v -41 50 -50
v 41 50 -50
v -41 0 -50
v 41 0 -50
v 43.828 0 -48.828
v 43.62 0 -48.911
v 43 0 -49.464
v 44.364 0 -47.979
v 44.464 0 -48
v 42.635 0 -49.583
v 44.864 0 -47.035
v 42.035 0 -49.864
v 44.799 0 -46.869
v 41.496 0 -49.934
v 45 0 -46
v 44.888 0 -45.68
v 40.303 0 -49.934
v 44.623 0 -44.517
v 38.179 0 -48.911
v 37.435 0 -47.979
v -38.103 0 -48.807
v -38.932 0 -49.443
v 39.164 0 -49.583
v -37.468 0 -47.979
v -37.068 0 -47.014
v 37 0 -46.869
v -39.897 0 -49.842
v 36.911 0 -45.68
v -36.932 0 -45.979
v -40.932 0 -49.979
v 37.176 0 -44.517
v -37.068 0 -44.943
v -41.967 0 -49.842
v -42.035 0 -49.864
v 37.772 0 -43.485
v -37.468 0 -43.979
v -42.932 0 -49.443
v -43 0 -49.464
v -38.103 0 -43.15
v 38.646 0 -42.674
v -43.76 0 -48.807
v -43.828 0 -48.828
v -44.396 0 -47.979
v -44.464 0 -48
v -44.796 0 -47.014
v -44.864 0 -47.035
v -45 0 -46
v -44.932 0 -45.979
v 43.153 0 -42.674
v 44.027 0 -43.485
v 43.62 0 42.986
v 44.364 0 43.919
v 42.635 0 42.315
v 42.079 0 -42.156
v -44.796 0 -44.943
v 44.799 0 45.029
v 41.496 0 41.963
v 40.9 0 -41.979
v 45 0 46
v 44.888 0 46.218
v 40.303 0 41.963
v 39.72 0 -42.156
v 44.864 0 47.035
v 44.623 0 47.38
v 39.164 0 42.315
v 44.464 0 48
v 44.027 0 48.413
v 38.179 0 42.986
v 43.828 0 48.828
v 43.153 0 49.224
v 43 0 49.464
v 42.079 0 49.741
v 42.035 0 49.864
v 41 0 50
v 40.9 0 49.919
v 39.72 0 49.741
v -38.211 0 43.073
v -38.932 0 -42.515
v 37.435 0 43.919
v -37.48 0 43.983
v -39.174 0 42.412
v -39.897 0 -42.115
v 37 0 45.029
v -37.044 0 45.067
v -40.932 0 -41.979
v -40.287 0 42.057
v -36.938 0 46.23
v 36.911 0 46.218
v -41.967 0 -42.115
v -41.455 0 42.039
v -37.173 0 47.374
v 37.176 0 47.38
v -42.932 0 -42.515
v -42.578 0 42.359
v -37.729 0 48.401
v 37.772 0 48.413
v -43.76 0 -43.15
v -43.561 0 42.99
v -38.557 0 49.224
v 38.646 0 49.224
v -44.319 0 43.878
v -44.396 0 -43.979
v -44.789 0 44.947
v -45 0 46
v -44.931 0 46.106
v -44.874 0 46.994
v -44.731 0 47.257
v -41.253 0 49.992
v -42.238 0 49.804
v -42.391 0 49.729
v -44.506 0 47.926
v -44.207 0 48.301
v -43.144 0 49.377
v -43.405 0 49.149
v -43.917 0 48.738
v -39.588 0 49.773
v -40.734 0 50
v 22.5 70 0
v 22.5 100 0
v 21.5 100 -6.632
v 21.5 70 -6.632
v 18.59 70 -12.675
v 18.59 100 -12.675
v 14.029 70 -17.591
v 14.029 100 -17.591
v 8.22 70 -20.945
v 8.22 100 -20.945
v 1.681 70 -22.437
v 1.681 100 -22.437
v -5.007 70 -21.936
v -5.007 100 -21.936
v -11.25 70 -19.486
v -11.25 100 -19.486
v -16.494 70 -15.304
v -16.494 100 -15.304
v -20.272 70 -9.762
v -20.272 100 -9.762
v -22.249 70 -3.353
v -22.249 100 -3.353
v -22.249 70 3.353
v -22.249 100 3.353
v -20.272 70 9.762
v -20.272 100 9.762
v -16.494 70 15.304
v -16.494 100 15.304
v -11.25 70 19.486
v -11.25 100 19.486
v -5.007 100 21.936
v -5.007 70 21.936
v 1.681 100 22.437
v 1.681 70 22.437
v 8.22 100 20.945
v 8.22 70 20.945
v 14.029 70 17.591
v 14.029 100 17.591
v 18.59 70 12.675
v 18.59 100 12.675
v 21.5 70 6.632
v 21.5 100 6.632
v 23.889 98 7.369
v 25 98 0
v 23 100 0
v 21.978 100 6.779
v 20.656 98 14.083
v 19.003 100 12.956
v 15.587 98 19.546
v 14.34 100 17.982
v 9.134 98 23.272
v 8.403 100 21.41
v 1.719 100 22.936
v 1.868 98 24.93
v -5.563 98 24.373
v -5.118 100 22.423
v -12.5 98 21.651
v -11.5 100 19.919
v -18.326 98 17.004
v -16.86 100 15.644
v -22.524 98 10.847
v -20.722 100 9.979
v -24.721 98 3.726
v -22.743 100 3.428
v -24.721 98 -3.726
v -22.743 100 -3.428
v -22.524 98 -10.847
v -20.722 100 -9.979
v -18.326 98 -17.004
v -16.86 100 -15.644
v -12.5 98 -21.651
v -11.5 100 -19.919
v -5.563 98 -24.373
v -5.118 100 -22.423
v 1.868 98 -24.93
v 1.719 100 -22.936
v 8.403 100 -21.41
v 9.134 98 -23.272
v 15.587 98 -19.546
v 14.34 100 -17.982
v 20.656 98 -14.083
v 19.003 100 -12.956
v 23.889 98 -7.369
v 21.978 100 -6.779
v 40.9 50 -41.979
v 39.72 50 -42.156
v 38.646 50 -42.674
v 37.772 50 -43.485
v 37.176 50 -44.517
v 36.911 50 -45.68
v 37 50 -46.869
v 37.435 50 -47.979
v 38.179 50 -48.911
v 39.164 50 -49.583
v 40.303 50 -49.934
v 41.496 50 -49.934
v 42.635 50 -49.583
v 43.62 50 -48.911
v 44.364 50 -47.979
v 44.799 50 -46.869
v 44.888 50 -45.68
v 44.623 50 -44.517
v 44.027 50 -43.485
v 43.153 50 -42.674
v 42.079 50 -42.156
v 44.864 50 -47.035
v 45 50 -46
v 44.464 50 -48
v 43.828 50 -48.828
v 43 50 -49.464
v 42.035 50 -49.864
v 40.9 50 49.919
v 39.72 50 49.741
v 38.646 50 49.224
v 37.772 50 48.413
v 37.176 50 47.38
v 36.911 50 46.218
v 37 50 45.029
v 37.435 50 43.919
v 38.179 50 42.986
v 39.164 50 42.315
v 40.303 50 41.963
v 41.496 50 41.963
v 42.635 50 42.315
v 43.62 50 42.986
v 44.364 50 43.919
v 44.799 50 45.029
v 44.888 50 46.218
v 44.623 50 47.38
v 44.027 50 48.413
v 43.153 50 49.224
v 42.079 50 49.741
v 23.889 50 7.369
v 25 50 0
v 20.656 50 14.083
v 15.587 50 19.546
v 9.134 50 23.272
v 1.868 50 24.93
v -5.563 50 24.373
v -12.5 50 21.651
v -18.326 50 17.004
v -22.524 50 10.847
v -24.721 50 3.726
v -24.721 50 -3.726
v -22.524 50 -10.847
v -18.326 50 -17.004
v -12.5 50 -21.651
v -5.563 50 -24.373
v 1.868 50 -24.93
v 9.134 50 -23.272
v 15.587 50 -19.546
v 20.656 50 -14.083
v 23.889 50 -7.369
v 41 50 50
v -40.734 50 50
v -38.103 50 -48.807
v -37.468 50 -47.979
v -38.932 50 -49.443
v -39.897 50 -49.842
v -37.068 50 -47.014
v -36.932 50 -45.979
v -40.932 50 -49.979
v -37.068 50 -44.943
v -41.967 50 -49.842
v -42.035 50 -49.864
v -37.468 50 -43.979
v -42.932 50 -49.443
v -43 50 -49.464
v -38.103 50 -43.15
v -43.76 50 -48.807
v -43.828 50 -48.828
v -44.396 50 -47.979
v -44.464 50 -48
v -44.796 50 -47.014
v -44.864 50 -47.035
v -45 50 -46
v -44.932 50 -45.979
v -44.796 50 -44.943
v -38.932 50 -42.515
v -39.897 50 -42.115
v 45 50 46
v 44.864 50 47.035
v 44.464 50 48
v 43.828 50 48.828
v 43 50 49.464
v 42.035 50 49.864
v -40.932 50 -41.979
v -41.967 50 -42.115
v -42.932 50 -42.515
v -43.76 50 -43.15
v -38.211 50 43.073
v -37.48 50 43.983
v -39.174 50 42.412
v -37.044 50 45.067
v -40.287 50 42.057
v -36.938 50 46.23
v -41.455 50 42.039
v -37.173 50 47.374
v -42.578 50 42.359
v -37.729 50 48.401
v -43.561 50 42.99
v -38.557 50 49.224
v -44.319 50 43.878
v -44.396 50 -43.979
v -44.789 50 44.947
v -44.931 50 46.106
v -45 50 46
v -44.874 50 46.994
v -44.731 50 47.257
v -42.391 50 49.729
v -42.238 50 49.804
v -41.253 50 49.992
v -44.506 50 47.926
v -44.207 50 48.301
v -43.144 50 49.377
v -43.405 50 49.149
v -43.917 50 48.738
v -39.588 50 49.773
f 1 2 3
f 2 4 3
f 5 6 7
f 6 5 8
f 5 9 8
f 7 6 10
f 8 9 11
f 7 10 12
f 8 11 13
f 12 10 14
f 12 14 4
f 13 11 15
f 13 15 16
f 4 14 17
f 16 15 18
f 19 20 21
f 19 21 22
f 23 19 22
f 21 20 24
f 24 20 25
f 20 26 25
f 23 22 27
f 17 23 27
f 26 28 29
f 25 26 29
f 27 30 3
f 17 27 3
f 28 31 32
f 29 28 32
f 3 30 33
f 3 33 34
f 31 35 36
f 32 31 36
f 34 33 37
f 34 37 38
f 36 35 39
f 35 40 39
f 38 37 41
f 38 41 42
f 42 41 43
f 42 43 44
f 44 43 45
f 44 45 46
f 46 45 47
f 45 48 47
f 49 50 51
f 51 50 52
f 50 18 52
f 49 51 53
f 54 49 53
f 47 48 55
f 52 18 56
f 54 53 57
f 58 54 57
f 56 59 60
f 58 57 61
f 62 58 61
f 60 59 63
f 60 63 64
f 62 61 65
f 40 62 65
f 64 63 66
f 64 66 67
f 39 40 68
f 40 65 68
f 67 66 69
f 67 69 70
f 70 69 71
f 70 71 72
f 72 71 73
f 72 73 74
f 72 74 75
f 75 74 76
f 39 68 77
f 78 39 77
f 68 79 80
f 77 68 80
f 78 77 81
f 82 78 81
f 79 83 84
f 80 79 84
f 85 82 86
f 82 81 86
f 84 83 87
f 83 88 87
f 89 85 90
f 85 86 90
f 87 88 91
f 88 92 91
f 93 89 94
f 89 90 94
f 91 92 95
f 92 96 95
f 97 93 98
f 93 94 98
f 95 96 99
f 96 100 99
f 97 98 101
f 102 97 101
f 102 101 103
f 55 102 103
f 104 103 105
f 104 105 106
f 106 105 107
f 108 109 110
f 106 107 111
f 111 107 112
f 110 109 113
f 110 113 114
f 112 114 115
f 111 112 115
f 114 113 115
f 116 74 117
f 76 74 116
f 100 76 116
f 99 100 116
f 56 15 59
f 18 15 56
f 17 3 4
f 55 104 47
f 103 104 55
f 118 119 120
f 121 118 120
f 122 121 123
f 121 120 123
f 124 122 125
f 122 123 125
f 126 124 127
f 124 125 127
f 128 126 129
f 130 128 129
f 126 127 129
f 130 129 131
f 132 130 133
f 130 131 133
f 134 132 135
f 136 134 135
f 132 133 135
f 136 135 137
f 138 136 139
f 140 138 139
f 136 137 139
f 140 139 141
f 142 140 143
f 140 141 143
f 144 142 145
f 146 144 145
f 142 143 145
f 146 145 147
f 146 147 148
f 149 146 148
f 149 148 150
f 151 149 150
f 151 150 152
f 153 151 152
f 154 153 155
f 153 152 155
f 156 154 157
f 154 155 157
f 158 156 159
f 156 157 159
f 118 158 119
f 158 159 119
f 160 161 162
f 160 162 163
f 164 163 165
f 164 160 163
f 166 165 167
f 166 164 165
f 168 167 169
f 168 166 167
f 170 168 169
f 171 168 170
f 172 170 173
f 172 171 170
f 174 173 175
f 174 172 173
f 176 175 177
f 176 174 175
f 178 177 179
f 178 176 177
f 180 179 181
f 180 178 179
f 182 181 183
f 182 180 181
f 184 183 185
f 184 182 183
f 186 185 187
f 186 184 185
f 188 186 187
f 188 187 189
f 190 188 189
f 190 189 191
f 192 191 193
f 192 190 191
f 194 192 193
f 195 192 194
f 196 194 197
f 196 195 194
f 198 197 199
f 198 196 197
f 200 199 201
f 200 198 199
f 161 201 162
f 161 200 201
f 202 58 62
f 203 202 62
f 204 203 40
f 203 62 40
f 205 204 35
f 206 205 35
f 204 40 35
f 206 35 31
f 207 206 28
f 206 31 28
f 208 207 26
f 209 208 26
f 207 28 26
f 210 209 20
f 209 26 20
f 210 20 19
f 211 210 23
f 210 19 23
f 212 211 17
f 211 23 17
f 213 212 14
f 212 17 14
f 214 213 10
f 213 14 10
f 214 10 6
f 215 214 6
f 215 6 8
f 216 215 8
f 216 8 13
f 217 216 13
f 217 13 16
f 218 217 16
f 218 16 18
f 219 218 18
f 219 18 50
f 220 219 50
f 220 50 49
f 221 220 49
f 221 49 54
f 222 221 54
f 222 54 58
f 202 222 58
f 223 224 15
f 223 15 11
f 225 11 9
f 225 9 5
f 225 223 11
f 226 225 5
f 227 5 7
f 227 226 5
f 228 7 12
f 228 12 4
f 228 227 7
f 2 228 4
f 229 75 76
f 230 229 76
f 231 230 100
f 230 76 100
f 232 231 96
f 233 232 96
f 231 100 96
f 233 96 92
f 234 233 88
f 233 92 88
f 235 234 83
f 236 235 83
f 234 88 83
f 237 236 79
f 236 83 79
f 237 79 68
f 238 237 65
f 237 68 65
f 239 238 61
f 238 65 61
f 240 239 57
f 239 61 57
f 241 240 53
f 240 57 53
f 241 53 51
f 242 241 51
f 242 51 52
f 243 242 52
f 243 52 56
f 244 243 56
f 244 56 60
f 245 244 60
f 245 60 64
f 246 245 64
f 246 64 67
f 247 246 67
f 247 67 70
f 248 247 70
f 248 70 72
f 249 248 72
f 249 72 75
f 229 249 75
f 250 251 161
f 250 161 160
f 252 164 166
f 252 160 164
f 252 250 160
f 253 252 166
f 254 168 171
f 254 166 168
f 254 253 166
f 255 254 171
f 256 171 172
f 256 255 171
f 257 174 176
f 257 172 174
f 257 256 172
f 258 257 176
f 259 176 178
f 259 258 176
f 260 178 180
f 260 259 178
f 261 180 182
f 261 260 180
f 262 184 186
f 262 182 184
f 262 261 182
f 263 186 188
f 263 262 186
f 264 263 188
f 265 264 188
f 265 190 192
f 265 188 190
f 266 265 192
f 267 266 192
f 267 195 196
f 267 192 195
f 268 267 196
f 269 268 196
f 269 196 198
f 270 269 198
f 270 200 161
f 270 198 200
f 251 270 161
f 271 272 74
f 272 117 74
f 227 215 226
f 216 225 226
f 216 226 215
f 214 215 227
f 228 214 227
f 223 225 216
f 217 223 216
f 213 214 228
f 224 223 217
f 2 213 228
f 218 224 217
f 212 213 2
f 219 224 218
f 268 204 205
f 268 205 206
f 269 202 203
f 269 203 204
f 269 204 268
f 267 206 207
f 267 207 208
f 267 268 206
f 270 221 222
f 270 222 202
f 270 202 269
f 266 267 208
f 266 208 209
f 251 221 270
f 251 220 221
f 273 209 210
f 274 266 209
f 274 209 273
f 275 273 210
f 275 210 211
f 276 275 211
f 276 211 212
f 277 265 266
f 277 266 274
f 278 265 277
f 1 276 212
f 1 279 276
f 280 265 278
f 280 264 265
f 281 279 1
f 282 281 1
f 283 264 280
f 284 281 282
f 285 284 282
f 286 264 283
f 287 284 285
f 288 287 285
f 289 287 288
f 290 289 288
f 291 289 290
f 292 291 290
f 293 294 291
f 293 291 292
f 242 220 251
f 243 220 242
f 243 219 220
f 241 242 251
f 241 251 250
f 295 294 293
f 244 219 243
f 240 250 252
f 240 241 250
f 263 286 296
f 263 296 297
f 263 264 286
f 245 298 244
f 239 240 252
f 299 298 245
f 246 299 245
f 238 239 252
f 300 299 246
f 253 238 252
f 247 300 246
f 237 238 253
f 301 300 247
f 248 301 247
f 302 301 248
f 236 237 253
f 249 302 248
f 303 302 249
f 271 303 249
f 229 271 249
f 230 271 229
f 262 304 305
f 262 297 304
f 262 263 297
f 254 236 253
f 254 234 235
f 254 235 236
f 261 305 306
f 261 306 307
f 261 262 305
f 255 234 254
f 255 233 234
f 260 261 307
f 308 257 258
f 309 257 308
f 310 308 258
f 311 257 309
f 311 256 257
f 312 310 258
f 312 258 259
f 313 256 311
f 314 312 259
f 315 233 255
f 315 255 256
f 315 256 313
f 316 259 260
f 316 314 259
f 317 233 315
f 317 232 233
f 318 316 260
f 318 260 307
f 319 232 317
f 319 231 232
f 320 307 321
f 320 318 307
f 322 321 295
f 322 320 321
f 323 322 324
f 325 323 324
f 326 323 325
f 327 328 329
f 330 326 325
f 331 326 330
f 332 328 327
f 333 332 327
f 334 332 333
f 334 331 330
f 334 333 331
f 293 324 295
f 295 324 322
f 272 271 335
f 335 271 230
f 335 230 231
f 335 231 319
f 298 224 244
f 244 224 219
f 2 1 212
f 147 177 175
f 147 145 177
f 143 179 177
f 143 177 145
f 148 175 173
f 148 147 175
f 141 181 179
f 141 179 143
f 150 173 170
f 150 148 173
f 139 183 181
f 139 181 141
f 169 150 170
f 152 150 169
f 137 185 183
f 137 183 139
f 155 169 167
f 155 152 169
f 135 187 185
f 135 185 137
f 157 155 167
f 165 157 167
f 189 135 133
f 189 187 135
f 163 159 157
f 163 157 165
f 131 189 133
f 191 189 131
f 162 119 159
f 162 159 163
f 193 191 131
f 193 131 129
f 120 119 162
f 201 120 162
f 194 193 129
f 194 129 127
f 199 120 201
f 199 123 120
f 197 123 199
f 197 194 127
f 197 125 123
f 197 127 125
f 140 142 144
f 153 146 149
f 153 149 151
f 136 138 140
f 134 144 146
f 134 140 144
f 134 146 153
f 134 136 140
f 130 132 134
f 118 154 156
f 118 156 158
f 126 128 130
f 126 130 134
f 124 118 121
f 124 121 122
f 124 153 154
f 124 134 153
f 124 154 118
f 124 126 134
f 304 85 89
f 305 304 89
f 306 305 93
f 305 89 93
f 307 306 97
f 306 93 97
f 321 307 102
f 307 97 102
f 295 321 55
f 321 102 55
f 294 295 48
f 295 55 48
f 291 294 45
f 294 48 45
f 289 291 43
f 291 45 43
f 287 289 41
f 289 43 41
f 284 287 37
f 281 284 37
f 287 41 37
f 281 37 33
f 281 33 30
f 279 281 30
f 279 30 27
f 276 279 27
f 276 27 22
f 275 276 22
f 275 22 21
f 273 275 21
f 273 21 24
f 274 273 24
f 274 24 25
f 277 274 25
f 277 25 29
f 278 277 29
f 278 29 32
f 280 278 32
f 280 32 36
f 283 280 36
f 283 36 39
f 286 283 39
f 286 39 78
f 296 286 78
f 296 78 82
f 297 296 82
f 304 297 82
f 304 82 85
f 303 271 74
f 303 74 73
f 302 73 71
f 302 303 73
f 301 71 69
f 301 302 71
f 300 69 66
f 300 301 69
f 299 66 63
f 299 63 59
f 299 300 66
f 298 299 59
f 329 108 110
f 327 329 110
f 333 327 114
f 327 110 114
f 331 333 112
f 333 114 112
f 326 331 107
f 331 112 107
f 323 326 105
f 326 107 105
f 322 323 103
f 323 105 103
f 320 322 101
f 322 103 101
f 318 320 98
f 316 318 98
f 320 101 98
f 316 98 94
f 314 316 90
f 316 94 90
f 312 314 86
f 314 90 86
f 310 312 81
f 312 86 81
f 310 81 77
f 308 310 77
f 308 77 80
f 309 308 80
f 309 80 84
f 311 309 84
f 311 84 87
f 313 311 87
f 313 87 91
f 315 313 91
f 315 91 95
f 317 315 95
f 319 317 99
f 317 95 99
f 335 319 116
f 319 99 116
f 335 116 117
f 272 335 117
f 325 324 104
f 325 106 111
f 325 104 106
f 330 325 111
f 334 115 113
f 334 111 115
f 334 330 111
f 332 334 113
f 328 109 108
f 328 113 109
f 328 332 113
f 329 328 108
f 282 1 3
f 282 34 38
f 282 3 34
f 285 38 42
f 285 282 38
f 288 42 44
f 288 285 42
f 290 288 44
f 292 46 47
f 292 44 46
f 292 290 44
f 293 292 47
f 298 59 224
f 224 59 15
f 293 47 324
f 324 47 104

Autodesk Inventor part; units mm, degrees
ref_plane "YZ Plane" through (0, 0, 0) normal (1, 0, 0) x (0, 1, 0)
ref_plane "XZ Plane" through (0, 0, 0) normal (0, 1, 0) x (-1, 0, 0)
ref_plane "XY Plane" through (0, 0, 0) normal (0, 0, 1) x (1, 0, 0)
sketch "Sketch1" plane through (0, 0, 0) normal (0, 1, 0) x (-1, 0, 0)
  line L0 (45, 50) -> (-45, 50)
  line L1 (-45, 50) -> (-45, -50)
  line L2 (-45, -50) -> (45, -50)
  line L3 (45, -50) -> (45, 50)
  line L4 (45, 50) -> (-45, -50) construction
  line L5 (-45, 50) -> (45, -50) construction
  point P0 (0, 0)
  point P1 (42.3062, 47.0069)
  point P2 (42.3062, -47.0069)
  point P3 (-42.3062, -47.0069)
  point P4 (-42.3062, 47.0069)
  dimension "d0" = 90
  dimension "d1" = 100
extrude "Extrusion1" add sketch "Sketch1" along normal blind 50
sketch "Sketch2" plane through (0, 50, 0) normal (0, 1, 0) x (1, 0, 0)
  circle A0 centre (0, 0) radius 25
  dimension "d5" = 50
extrude "Extrusion2" add sketch "Sketch2" along normal blind 50
sketch "Sketch3" plane through (0, 50, 0) normal (0, 1, 0) x (1, 0, 0)
  point P0 (0, 0)
fillet "Fillet1" radius 4 1 edges at (45, 25, 50)
fillet "Fillet2" radius 4 3 edges at (-45, 25, 50) (45, 25, -50) (-45, 25, -50)
sketch "Sketch4" plane through (0, 50, 0) normal (0, 1, 0) x (1, 0, 0)
  circle A0 centre (-40.9319, 45.9787) radius 4
  circle A1 centre (40.8995, 45.9787) radius 4
  circle A2 centre (40.8995, -45.9186) radius 4
  circle A3 centre (-40.9319, -46.0049) radius 4
  point P0 (0, 0)
  dimension "d20" = 8
  dimension "d21" = 8
  dimension "d22" = 8
  dimension "d23" = 8
sketch "Sketch5" plane through (0, 50, 0) normal (0, 1, 0) x (1, 0, 0)
  circle A0 centre (0, 0) radius 22.5
  dimension "d16" = 45
sketch "Sketch6" plane through (0, 100, 0) normal (0, 1, 0) x (1, 0, 0)
  circle A0 centre (0, 0) radius 22.5
  dimension "d17" = 45
extrude "Extrusion3" cut sketch "Sketch6" against normal blind 30
sketch "Sketch7" plane through (0, 50, 0) normal (0, 1, 0) x (1, 0, 0)
  point P0 (0, 0)
sketch "Sketch8" plane through (0, 50, 0) normal (0, 1, 0) x (1, 0, 0)
  point P0 (0, 0)
hole "Hole1" at (40.8995, 50, 45.9186) direction (0, -1, 0) diameter 8 end through all
hole "Hole2" at (40.8995, 50, -45.9787) direction (0, -1, 0) diameter 8 end through all
hole "Hole3" at (-40.9319, 50, 46.0049) direction (0, -1, 0) diameter 8 end through all
hole "Hole4" at (-40.9319, 50, -45.9787) direction (0, -1, 0) diameter 8 end through all
thread "Thread1" size "M8x1.25" class "6H" standard "ANSI Metric M Profile" full length
thread "Thread2" size "M8x1.25" class "6H" standard "ANSI Metric M Profile" full length
thread "Thread3" size "M8x1.25" class "6H" standard "ANSI Metric M Profile" full length
thread "Thread4" size "M8x1.25" class "6H" standard "ANSI Metric M Profile" full length
chamfer "Chamfer1" distance 2 angle 45 1 edges at (-25, 100, 0)
sketch "Sketch9" plane through (0, 50, 0) normal (0, 1, 0) x (1, 0, 0)
  point P0 (0, 0)
sketch "Sketch10" plane through (0, 50, 0) normal (0, 1, 0) x (1, 0, 0)
  point P0 (0, 0)
sketch "Sketch11" plane through (0, 50, 0) normal (0, 1, 0) x (1, 0, 0)
  line L0 (45, -46) -> (45, 46) projected
  line L1 (-45, 46) -> (-45, -46) projected
  line L2 (41, 50) -> (-41, 50) projected
  line L3 (-40.7332, -50) -> (41, -50) projected
  point P0 (0, 0)
  point P1 (45, 0)
  point P2 (-45, 0)
  point P3 (0, 50)
  point P4 (0.1334, -50)
  dimension "d63" = 90
  dimension "d64" = 100
properties part number "Practica 1"
